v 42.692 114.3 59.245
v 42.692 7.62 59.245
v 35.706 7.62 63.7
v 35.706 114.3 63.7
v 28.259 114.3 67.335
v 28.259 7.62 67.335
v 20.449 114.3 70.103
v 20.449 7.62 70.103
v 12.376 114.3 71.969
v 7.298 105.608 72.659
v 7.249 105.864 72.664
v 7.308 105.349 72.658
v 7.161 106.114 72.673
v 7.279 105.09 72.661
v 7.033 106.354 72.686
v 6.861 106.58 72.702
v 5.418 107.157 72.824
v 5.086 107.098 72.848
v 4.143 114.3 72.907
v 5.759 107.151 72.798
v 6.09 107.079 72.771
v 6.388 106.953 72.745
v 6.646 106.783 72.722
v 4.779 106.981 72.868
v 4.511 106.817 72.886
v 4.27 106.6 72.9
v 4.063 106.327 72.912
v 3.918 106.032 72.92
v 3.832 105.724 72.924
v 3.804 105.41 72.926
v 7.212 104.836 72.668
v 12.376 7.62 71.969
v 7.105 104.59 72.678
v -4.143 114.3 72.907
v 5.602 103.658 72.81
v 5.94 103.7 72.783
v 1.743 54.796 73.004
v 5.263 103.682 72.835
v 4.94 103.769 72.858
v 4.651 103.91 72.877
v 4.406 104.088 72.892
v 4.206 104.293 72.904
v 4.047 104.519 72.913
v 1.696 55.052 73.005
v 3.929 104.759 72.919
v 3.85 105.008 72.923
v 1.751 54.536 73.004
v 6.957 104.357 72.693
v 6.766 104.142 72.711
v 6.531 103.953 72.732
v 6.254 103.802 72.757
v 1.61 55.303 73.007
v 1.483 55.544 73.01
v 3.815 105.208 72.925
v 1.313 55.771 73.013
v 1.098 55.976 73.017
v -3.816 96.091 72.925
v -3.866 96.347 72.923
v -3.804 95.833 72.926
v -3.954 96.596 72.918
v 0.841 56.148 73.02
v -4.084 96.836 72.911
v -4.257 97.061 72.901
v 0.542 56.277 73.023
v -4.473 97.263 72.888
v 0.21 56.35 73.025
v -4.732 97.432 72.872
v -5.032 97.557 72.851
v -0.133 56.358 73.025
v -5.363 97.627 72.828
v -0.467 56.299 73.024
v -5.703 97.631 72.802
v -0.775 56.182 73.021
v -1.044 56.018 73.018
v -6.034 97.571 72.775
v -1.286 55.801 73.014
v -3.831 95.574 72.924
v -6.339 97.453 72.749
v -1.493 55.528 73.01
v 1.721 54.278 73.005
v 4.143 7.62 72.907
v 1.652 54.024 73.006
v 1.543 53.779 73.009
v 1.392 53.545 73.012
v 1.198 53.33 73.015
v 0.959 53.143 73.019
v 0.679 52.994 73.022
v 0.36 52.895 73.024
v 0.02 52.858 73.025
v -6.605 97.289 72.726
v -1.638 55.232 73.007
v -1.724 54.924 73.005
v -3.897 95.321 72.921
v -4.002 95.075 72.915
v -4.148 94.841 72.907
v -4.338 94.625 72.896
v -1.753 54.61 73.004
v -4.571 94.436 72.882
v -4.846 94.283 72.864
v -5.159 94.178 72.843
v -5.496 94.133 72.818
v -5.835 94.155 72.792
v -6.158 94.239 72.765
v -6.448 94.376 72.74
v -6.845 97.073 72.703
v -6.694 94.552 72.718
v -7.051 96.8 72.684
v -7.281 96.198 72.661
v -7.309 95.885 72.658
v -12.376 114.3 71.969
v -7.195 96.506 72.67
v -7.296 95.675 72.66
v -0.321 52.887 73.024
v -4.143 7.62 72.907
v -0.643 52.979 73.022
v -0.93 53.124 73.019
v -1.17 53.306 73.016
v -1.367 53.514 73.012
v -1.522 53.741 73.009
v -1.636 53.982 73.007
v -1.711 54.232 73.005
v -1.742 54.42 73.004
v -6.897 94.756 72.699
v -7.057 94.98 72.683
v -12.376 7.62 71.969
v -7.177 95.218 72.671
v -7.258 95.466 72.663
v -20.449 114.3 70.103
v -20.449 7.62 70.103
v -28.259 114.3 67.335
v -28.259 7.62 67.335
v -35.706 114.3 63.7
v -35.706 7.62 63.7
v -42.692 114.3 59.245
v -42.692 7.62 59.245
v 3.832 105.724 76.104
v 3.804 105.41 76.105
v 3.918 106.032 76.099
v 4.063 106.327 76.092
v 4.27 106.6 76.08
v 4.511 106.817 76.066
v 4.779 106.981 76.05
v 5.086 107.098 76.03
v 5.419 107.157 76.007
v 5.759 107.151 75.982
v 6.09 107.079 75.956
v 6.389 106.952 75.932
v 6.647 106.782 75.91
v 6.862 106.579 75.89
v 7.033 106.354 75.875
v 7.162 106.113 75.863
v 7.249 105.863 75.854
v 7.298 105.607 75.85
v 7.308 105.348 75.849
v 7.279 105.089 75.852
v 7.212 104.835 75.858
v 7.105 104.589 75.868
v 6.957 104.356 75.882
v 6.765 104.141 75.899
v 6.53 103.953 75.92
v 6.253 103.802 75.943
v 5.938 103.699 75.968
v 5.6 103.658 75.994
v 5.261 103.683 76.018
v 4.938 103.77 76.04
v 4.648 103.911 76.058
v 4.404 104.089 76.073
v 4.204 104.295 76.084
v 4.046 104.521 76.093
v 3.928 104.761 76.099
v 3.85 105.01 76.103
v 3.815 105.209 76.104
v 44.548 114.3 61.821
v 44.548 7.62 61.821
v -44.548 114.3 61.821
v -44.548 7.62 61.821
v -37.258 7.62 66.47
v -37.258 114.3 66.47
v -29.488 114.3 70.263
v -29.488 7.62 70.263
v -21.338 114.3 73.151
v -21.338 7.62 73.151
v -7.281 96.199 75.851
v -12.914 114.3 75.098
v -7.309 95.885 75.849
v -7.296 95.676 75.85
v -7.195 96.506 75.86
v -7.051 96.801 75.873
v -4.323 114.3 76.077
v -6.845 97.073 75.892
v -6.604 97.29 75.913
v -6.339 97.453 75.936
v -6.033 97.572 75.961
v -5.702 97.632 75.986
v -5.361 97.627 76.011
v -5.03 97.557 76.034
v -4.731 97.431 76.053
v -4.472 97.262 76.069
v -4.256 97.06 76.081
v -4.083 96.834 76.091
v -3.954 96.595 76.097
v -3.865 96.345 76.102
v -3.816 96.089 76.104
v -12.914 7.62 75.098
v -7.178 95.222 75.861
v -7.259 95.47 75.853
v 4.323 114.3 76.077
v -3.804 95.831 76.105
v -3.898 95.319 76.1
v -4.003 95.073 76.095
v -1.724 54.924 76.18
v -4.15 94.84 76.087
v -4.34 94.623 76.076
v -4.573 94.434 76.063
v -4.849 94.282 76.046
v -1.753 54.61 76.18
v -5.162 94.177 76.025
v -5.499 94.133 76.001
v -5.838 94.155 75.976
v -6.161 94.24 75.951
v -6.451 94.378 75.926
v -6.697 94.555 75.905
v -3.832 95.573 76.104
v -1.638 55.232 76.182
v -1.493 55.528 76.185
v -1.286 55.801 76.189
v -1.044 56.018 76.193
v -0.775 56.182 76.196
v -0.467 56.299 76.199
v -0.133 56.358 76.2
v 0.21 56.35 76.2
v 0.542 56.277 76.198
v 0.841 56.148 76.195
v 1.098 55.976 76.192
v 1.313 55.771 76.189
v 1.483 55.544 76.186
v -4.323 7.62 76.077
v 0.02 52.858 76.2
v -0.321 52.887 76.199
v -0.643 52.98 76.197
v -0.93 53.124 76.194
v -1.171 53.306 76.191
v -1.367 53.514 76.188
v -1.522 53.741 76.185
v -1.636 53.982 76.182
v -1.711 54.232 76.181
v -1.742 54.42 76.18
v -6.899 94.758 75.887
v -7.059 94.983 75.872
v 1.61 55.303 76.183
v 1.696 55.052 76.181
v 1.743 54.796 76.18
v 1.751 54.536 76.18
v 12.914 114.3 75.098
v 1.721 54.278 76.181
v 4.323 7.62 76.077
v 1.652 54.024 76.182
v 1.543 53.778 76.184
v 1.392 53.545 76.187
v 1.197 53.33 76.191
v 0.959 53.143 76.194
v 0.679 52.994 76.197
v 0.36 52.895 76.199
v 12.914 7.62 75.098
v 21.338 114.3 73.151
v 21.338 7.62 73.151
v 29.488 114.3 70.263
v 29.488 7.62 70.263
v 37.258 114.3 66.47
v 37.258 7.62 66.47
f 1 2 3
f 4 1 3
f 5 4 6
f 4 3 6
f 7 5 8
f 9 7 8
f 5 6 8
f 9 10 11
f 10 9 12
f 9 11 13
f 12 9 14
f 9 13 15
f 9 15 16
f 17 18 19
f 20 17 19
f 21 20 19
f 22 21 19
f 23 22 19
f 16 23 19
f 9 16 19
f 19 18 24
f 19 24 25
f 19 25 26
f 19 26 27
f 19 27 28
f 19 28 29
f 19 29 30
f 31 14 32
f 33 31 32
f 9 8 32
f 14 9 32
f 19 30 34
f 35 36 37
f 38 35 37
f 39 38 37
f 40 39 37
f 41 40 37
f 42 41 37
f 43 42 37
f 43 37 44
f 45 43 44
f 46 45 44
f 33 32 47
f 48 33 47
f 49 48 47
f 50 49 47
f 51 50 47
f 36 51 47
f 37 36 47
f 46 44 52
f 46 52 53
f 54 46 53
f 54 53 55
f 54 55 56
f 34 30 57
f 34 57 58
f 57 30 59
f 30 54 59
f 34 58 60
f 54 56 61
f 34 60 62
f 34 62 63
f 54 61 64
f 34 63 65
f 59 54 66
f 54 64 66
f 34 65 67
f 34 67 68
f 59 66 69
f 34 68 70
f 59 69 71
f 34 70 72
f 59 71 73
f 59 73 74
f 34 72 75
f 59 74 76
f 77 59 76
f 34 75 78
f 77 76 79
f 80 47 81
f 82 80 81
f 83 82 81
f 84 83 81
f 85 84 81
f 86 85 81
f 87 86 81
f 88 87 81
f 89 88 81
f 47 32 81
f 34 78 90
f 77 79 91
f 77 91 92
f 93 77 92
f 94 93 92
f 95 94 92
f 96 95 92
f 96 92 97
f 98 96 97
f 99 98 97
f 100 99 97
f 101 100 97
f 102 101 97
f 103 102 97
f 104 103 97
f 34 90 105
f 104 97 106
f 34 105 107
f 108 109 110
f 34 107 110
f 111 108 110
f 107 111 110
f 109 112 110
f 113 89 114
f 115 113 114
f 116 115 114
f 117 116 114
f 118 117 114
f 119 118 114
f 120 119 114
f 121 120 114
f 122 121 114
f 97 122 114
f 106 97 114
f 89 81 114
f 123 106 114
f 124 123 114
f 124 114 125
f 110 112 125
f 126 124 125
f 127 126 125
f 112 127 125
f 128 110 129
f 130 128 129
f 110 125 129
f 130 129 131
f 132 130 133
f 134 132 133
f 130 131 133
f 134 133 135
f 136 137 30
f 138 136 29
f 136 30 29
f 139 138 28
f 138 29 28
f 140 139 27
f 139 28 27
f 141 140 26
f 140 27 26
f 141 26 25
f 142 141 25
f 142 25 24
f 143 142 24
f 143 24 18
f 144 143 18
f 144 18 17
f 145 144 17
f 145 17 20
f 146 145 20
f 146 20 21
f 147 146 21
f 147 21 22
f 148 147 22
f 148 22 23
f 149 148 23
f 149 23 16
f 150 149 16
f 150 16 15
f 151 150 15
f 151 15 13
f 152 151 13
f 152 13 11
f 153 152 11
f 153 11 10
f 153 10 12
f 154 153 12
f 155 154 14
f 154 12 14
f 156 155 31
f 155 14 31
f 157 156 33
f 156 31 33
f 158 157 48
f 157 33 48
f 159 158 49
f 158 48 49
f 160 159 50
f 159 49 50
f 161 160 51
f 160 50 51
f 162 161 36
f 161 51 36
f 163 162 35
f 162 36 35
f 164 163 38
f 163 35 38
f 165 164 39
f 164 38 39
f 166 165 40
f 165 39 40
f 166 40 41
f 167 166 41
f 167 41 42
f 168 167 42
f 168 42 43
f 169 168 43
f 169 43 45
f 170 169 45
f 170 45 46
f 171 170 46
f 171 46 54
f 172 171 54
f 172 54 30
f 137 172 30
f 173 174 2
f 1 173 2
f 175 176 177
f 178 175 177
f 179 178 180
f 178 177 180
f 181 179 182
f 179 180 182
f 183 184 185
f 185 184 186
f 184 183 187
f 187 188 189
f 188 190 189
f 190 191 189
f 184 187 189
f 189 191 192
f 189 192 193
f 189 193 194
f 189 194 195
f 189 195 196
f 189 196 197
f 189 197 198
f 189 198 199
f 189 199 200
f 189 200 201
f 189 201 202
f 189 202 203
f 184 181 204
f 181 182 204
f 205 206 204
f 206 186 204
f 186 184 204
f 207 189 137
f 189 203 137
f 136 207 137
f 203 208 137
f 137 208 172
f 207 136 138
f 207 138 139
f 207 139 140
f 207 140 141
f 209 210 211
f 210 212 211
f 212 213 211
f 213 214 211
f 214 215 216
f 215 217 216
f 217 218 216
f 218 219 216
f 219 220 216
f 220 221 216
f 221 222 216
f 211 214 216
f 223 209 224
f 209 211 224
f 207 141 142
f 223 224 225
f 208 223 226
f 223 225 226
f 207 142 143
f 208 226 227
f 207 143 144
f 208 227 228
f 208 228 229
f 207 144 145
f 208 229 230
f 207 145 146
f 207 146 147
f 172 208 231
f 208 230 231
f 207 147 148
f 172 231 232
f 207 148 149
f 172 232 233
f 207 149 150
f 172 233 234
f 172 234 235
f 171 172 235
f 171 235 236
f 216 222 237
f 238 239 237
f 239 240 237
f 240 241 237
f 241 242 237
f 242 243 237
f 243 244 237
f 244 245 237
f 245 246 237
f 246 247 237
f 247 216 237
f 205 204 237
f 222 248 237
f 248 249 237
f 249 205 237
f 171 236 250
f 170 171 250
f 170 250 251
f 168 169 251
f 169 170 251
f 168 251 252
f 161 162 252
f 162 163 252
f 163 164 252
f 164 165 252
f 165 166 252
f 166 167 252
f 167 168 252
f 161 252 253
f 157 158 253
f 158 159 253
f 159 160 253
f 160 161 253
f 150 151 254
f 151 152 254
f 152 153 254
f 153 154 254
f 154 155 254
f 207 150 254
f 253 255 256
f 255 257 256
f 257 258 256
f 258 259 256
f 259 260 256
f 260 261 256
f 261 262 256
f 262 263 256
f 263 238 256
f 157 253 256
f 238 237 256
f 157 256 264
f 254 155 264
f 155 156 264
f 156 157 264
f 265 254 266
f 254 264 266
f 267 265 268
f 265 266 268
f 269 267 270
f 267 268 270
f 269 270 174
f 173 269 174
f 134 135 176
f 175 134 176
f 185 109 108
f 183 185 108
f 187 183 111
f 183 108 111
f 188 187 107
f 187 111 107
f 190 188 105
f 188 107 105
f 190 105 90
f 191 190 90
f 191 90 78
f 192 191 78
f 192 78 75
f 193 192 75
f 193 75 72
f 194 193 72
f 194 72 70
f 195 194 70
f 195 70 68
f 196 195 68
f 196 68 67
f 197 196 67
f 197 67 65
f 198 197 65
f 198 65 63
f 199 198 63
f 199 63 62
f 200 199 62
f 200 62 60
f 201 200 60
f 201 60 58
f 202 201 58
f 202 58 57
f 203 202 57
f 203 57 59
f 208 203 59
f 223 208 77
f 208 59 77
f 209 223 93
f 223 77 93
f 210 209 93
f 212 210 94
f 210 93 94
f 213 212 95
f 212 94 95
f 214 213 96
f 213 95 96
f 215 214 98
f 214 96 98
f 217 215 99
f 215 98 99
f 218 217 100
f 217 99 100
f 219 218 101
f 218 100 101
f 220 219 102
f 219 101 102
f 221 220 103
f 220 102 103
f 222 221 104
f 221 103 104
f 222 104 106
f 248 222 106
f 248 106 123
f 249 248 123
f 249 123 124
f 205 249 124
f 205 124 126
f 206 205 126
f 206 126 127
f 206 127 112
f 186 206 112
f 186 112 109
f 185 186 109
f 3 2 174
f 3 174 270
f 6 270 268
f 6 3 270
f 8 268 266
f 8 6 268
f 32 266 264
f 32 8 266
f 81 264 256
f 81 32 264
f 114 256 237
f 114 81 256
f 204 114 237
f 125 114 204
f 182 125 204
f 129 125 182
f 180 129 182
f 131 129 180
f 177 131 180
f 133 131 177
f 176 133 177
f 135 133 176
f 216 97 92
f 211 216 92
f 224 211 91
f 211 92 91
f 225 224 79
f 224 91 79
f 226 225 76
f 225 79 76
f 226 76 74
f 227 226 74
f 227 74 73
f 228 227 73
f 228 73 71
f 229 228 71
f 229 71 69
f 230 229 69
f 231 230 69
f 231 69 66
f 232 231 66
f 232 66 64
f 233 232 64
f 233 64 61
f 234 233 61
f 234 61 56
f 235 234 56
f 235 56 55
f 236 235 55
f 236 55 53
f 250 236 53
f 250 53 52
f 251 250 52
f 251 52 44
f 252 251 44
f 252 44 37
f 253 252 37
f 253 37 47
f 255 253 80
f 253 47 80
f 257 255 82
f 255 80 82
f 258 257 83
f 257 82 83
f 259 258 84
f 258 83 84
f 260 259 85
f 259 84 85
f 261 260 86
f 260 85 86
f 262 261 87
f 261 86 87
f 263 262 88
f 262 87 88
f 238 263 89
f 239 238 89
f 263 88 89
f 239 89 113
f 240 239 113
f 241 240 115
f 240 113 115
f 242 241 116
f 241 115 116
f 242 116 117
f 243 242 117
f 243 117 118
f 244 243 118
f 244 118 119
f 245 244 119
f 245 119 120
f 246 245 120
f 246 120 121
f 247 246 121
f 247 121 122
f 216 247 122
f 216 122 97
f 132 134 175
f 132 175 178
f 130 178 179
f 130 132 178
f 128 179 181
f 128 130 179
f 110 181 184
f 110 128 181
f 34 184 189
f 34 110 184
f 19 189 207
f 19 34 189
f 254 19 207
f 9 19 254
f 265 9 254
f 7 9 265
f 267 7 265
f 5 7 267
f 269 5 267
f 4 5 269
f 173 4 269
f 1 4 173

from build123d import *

# Parameters (mm, degrees)
BOSS_EXTRUDE1_DEPTH = 114.3
SKETCH2_R           = 1.7526
CUT_EXTRUDE1_DEPTH  = 25.4
SKETCH3_W           = 89.096923456
SKETCH3_H           = 11.672787919
CUT_EXTRUDE2_DEPTH  = 25.4


with BuildPart() as part:
    # Sketch1 → Boss-Extrude1 (new body)
    with BuildSketch(Plane(origin=(0, 0, 0), x_dir=(1, 0, 0), z_dir=(0, 1, 0))):
        with BuildLine():
            Line((-42.692275823, -59.245423537), (-44.548461728, -61.821311517))
            ThreePointArc((-44.548461728, -61.821311517), (0, -76.2), (44.548461728, -61.821311517))
            Line((44.548461728, -61.821311517), (42.692275823, -59.245423537))
            ThreePointArc((42.692275823, -59.245423537), (0, -73.025), (-42.692275823, -59.245423537))
        make_face()
    extrude(amount=BOSS_EXTRUDE1_DEPTH)

    # Sketch2 → Cut-Extrude1 (cut)
    with BuildSketch(Plane(origin=(0, 0, 59.245423537), x_dir=(-1, 0, 0), z_dir=(0, 0, -1))):
        with Locations((0, 54.61)):
            Circle(SKETCH2_R)
        with Locations((-5.55625, 105.41)):
            Circle(SKETCH2_R)
        with Locations((5.55625, 95.885)):
            Circle(SKETCH2_R)
    extrude(amount=-CUT_EXTRUDE1_DEPTH, mode=Mode.SUBTRACT)

    # Sketch3 → Cut-Extrude2 (cut)
    with BuildSketch(Plane(origin=(0, 0, 59.245423537), x_dir=(-1, 0, 0), z_dir=(0, 0, -1))):
        with Locations((0, 1.783606041)):
            Rectangle(SKETCH3_W, SKETCH3_H)
    extrude(amount=-CUT_EXTRUDE2_DEPTH, mode=Mode.SUBTRACT)


solid = part.part
